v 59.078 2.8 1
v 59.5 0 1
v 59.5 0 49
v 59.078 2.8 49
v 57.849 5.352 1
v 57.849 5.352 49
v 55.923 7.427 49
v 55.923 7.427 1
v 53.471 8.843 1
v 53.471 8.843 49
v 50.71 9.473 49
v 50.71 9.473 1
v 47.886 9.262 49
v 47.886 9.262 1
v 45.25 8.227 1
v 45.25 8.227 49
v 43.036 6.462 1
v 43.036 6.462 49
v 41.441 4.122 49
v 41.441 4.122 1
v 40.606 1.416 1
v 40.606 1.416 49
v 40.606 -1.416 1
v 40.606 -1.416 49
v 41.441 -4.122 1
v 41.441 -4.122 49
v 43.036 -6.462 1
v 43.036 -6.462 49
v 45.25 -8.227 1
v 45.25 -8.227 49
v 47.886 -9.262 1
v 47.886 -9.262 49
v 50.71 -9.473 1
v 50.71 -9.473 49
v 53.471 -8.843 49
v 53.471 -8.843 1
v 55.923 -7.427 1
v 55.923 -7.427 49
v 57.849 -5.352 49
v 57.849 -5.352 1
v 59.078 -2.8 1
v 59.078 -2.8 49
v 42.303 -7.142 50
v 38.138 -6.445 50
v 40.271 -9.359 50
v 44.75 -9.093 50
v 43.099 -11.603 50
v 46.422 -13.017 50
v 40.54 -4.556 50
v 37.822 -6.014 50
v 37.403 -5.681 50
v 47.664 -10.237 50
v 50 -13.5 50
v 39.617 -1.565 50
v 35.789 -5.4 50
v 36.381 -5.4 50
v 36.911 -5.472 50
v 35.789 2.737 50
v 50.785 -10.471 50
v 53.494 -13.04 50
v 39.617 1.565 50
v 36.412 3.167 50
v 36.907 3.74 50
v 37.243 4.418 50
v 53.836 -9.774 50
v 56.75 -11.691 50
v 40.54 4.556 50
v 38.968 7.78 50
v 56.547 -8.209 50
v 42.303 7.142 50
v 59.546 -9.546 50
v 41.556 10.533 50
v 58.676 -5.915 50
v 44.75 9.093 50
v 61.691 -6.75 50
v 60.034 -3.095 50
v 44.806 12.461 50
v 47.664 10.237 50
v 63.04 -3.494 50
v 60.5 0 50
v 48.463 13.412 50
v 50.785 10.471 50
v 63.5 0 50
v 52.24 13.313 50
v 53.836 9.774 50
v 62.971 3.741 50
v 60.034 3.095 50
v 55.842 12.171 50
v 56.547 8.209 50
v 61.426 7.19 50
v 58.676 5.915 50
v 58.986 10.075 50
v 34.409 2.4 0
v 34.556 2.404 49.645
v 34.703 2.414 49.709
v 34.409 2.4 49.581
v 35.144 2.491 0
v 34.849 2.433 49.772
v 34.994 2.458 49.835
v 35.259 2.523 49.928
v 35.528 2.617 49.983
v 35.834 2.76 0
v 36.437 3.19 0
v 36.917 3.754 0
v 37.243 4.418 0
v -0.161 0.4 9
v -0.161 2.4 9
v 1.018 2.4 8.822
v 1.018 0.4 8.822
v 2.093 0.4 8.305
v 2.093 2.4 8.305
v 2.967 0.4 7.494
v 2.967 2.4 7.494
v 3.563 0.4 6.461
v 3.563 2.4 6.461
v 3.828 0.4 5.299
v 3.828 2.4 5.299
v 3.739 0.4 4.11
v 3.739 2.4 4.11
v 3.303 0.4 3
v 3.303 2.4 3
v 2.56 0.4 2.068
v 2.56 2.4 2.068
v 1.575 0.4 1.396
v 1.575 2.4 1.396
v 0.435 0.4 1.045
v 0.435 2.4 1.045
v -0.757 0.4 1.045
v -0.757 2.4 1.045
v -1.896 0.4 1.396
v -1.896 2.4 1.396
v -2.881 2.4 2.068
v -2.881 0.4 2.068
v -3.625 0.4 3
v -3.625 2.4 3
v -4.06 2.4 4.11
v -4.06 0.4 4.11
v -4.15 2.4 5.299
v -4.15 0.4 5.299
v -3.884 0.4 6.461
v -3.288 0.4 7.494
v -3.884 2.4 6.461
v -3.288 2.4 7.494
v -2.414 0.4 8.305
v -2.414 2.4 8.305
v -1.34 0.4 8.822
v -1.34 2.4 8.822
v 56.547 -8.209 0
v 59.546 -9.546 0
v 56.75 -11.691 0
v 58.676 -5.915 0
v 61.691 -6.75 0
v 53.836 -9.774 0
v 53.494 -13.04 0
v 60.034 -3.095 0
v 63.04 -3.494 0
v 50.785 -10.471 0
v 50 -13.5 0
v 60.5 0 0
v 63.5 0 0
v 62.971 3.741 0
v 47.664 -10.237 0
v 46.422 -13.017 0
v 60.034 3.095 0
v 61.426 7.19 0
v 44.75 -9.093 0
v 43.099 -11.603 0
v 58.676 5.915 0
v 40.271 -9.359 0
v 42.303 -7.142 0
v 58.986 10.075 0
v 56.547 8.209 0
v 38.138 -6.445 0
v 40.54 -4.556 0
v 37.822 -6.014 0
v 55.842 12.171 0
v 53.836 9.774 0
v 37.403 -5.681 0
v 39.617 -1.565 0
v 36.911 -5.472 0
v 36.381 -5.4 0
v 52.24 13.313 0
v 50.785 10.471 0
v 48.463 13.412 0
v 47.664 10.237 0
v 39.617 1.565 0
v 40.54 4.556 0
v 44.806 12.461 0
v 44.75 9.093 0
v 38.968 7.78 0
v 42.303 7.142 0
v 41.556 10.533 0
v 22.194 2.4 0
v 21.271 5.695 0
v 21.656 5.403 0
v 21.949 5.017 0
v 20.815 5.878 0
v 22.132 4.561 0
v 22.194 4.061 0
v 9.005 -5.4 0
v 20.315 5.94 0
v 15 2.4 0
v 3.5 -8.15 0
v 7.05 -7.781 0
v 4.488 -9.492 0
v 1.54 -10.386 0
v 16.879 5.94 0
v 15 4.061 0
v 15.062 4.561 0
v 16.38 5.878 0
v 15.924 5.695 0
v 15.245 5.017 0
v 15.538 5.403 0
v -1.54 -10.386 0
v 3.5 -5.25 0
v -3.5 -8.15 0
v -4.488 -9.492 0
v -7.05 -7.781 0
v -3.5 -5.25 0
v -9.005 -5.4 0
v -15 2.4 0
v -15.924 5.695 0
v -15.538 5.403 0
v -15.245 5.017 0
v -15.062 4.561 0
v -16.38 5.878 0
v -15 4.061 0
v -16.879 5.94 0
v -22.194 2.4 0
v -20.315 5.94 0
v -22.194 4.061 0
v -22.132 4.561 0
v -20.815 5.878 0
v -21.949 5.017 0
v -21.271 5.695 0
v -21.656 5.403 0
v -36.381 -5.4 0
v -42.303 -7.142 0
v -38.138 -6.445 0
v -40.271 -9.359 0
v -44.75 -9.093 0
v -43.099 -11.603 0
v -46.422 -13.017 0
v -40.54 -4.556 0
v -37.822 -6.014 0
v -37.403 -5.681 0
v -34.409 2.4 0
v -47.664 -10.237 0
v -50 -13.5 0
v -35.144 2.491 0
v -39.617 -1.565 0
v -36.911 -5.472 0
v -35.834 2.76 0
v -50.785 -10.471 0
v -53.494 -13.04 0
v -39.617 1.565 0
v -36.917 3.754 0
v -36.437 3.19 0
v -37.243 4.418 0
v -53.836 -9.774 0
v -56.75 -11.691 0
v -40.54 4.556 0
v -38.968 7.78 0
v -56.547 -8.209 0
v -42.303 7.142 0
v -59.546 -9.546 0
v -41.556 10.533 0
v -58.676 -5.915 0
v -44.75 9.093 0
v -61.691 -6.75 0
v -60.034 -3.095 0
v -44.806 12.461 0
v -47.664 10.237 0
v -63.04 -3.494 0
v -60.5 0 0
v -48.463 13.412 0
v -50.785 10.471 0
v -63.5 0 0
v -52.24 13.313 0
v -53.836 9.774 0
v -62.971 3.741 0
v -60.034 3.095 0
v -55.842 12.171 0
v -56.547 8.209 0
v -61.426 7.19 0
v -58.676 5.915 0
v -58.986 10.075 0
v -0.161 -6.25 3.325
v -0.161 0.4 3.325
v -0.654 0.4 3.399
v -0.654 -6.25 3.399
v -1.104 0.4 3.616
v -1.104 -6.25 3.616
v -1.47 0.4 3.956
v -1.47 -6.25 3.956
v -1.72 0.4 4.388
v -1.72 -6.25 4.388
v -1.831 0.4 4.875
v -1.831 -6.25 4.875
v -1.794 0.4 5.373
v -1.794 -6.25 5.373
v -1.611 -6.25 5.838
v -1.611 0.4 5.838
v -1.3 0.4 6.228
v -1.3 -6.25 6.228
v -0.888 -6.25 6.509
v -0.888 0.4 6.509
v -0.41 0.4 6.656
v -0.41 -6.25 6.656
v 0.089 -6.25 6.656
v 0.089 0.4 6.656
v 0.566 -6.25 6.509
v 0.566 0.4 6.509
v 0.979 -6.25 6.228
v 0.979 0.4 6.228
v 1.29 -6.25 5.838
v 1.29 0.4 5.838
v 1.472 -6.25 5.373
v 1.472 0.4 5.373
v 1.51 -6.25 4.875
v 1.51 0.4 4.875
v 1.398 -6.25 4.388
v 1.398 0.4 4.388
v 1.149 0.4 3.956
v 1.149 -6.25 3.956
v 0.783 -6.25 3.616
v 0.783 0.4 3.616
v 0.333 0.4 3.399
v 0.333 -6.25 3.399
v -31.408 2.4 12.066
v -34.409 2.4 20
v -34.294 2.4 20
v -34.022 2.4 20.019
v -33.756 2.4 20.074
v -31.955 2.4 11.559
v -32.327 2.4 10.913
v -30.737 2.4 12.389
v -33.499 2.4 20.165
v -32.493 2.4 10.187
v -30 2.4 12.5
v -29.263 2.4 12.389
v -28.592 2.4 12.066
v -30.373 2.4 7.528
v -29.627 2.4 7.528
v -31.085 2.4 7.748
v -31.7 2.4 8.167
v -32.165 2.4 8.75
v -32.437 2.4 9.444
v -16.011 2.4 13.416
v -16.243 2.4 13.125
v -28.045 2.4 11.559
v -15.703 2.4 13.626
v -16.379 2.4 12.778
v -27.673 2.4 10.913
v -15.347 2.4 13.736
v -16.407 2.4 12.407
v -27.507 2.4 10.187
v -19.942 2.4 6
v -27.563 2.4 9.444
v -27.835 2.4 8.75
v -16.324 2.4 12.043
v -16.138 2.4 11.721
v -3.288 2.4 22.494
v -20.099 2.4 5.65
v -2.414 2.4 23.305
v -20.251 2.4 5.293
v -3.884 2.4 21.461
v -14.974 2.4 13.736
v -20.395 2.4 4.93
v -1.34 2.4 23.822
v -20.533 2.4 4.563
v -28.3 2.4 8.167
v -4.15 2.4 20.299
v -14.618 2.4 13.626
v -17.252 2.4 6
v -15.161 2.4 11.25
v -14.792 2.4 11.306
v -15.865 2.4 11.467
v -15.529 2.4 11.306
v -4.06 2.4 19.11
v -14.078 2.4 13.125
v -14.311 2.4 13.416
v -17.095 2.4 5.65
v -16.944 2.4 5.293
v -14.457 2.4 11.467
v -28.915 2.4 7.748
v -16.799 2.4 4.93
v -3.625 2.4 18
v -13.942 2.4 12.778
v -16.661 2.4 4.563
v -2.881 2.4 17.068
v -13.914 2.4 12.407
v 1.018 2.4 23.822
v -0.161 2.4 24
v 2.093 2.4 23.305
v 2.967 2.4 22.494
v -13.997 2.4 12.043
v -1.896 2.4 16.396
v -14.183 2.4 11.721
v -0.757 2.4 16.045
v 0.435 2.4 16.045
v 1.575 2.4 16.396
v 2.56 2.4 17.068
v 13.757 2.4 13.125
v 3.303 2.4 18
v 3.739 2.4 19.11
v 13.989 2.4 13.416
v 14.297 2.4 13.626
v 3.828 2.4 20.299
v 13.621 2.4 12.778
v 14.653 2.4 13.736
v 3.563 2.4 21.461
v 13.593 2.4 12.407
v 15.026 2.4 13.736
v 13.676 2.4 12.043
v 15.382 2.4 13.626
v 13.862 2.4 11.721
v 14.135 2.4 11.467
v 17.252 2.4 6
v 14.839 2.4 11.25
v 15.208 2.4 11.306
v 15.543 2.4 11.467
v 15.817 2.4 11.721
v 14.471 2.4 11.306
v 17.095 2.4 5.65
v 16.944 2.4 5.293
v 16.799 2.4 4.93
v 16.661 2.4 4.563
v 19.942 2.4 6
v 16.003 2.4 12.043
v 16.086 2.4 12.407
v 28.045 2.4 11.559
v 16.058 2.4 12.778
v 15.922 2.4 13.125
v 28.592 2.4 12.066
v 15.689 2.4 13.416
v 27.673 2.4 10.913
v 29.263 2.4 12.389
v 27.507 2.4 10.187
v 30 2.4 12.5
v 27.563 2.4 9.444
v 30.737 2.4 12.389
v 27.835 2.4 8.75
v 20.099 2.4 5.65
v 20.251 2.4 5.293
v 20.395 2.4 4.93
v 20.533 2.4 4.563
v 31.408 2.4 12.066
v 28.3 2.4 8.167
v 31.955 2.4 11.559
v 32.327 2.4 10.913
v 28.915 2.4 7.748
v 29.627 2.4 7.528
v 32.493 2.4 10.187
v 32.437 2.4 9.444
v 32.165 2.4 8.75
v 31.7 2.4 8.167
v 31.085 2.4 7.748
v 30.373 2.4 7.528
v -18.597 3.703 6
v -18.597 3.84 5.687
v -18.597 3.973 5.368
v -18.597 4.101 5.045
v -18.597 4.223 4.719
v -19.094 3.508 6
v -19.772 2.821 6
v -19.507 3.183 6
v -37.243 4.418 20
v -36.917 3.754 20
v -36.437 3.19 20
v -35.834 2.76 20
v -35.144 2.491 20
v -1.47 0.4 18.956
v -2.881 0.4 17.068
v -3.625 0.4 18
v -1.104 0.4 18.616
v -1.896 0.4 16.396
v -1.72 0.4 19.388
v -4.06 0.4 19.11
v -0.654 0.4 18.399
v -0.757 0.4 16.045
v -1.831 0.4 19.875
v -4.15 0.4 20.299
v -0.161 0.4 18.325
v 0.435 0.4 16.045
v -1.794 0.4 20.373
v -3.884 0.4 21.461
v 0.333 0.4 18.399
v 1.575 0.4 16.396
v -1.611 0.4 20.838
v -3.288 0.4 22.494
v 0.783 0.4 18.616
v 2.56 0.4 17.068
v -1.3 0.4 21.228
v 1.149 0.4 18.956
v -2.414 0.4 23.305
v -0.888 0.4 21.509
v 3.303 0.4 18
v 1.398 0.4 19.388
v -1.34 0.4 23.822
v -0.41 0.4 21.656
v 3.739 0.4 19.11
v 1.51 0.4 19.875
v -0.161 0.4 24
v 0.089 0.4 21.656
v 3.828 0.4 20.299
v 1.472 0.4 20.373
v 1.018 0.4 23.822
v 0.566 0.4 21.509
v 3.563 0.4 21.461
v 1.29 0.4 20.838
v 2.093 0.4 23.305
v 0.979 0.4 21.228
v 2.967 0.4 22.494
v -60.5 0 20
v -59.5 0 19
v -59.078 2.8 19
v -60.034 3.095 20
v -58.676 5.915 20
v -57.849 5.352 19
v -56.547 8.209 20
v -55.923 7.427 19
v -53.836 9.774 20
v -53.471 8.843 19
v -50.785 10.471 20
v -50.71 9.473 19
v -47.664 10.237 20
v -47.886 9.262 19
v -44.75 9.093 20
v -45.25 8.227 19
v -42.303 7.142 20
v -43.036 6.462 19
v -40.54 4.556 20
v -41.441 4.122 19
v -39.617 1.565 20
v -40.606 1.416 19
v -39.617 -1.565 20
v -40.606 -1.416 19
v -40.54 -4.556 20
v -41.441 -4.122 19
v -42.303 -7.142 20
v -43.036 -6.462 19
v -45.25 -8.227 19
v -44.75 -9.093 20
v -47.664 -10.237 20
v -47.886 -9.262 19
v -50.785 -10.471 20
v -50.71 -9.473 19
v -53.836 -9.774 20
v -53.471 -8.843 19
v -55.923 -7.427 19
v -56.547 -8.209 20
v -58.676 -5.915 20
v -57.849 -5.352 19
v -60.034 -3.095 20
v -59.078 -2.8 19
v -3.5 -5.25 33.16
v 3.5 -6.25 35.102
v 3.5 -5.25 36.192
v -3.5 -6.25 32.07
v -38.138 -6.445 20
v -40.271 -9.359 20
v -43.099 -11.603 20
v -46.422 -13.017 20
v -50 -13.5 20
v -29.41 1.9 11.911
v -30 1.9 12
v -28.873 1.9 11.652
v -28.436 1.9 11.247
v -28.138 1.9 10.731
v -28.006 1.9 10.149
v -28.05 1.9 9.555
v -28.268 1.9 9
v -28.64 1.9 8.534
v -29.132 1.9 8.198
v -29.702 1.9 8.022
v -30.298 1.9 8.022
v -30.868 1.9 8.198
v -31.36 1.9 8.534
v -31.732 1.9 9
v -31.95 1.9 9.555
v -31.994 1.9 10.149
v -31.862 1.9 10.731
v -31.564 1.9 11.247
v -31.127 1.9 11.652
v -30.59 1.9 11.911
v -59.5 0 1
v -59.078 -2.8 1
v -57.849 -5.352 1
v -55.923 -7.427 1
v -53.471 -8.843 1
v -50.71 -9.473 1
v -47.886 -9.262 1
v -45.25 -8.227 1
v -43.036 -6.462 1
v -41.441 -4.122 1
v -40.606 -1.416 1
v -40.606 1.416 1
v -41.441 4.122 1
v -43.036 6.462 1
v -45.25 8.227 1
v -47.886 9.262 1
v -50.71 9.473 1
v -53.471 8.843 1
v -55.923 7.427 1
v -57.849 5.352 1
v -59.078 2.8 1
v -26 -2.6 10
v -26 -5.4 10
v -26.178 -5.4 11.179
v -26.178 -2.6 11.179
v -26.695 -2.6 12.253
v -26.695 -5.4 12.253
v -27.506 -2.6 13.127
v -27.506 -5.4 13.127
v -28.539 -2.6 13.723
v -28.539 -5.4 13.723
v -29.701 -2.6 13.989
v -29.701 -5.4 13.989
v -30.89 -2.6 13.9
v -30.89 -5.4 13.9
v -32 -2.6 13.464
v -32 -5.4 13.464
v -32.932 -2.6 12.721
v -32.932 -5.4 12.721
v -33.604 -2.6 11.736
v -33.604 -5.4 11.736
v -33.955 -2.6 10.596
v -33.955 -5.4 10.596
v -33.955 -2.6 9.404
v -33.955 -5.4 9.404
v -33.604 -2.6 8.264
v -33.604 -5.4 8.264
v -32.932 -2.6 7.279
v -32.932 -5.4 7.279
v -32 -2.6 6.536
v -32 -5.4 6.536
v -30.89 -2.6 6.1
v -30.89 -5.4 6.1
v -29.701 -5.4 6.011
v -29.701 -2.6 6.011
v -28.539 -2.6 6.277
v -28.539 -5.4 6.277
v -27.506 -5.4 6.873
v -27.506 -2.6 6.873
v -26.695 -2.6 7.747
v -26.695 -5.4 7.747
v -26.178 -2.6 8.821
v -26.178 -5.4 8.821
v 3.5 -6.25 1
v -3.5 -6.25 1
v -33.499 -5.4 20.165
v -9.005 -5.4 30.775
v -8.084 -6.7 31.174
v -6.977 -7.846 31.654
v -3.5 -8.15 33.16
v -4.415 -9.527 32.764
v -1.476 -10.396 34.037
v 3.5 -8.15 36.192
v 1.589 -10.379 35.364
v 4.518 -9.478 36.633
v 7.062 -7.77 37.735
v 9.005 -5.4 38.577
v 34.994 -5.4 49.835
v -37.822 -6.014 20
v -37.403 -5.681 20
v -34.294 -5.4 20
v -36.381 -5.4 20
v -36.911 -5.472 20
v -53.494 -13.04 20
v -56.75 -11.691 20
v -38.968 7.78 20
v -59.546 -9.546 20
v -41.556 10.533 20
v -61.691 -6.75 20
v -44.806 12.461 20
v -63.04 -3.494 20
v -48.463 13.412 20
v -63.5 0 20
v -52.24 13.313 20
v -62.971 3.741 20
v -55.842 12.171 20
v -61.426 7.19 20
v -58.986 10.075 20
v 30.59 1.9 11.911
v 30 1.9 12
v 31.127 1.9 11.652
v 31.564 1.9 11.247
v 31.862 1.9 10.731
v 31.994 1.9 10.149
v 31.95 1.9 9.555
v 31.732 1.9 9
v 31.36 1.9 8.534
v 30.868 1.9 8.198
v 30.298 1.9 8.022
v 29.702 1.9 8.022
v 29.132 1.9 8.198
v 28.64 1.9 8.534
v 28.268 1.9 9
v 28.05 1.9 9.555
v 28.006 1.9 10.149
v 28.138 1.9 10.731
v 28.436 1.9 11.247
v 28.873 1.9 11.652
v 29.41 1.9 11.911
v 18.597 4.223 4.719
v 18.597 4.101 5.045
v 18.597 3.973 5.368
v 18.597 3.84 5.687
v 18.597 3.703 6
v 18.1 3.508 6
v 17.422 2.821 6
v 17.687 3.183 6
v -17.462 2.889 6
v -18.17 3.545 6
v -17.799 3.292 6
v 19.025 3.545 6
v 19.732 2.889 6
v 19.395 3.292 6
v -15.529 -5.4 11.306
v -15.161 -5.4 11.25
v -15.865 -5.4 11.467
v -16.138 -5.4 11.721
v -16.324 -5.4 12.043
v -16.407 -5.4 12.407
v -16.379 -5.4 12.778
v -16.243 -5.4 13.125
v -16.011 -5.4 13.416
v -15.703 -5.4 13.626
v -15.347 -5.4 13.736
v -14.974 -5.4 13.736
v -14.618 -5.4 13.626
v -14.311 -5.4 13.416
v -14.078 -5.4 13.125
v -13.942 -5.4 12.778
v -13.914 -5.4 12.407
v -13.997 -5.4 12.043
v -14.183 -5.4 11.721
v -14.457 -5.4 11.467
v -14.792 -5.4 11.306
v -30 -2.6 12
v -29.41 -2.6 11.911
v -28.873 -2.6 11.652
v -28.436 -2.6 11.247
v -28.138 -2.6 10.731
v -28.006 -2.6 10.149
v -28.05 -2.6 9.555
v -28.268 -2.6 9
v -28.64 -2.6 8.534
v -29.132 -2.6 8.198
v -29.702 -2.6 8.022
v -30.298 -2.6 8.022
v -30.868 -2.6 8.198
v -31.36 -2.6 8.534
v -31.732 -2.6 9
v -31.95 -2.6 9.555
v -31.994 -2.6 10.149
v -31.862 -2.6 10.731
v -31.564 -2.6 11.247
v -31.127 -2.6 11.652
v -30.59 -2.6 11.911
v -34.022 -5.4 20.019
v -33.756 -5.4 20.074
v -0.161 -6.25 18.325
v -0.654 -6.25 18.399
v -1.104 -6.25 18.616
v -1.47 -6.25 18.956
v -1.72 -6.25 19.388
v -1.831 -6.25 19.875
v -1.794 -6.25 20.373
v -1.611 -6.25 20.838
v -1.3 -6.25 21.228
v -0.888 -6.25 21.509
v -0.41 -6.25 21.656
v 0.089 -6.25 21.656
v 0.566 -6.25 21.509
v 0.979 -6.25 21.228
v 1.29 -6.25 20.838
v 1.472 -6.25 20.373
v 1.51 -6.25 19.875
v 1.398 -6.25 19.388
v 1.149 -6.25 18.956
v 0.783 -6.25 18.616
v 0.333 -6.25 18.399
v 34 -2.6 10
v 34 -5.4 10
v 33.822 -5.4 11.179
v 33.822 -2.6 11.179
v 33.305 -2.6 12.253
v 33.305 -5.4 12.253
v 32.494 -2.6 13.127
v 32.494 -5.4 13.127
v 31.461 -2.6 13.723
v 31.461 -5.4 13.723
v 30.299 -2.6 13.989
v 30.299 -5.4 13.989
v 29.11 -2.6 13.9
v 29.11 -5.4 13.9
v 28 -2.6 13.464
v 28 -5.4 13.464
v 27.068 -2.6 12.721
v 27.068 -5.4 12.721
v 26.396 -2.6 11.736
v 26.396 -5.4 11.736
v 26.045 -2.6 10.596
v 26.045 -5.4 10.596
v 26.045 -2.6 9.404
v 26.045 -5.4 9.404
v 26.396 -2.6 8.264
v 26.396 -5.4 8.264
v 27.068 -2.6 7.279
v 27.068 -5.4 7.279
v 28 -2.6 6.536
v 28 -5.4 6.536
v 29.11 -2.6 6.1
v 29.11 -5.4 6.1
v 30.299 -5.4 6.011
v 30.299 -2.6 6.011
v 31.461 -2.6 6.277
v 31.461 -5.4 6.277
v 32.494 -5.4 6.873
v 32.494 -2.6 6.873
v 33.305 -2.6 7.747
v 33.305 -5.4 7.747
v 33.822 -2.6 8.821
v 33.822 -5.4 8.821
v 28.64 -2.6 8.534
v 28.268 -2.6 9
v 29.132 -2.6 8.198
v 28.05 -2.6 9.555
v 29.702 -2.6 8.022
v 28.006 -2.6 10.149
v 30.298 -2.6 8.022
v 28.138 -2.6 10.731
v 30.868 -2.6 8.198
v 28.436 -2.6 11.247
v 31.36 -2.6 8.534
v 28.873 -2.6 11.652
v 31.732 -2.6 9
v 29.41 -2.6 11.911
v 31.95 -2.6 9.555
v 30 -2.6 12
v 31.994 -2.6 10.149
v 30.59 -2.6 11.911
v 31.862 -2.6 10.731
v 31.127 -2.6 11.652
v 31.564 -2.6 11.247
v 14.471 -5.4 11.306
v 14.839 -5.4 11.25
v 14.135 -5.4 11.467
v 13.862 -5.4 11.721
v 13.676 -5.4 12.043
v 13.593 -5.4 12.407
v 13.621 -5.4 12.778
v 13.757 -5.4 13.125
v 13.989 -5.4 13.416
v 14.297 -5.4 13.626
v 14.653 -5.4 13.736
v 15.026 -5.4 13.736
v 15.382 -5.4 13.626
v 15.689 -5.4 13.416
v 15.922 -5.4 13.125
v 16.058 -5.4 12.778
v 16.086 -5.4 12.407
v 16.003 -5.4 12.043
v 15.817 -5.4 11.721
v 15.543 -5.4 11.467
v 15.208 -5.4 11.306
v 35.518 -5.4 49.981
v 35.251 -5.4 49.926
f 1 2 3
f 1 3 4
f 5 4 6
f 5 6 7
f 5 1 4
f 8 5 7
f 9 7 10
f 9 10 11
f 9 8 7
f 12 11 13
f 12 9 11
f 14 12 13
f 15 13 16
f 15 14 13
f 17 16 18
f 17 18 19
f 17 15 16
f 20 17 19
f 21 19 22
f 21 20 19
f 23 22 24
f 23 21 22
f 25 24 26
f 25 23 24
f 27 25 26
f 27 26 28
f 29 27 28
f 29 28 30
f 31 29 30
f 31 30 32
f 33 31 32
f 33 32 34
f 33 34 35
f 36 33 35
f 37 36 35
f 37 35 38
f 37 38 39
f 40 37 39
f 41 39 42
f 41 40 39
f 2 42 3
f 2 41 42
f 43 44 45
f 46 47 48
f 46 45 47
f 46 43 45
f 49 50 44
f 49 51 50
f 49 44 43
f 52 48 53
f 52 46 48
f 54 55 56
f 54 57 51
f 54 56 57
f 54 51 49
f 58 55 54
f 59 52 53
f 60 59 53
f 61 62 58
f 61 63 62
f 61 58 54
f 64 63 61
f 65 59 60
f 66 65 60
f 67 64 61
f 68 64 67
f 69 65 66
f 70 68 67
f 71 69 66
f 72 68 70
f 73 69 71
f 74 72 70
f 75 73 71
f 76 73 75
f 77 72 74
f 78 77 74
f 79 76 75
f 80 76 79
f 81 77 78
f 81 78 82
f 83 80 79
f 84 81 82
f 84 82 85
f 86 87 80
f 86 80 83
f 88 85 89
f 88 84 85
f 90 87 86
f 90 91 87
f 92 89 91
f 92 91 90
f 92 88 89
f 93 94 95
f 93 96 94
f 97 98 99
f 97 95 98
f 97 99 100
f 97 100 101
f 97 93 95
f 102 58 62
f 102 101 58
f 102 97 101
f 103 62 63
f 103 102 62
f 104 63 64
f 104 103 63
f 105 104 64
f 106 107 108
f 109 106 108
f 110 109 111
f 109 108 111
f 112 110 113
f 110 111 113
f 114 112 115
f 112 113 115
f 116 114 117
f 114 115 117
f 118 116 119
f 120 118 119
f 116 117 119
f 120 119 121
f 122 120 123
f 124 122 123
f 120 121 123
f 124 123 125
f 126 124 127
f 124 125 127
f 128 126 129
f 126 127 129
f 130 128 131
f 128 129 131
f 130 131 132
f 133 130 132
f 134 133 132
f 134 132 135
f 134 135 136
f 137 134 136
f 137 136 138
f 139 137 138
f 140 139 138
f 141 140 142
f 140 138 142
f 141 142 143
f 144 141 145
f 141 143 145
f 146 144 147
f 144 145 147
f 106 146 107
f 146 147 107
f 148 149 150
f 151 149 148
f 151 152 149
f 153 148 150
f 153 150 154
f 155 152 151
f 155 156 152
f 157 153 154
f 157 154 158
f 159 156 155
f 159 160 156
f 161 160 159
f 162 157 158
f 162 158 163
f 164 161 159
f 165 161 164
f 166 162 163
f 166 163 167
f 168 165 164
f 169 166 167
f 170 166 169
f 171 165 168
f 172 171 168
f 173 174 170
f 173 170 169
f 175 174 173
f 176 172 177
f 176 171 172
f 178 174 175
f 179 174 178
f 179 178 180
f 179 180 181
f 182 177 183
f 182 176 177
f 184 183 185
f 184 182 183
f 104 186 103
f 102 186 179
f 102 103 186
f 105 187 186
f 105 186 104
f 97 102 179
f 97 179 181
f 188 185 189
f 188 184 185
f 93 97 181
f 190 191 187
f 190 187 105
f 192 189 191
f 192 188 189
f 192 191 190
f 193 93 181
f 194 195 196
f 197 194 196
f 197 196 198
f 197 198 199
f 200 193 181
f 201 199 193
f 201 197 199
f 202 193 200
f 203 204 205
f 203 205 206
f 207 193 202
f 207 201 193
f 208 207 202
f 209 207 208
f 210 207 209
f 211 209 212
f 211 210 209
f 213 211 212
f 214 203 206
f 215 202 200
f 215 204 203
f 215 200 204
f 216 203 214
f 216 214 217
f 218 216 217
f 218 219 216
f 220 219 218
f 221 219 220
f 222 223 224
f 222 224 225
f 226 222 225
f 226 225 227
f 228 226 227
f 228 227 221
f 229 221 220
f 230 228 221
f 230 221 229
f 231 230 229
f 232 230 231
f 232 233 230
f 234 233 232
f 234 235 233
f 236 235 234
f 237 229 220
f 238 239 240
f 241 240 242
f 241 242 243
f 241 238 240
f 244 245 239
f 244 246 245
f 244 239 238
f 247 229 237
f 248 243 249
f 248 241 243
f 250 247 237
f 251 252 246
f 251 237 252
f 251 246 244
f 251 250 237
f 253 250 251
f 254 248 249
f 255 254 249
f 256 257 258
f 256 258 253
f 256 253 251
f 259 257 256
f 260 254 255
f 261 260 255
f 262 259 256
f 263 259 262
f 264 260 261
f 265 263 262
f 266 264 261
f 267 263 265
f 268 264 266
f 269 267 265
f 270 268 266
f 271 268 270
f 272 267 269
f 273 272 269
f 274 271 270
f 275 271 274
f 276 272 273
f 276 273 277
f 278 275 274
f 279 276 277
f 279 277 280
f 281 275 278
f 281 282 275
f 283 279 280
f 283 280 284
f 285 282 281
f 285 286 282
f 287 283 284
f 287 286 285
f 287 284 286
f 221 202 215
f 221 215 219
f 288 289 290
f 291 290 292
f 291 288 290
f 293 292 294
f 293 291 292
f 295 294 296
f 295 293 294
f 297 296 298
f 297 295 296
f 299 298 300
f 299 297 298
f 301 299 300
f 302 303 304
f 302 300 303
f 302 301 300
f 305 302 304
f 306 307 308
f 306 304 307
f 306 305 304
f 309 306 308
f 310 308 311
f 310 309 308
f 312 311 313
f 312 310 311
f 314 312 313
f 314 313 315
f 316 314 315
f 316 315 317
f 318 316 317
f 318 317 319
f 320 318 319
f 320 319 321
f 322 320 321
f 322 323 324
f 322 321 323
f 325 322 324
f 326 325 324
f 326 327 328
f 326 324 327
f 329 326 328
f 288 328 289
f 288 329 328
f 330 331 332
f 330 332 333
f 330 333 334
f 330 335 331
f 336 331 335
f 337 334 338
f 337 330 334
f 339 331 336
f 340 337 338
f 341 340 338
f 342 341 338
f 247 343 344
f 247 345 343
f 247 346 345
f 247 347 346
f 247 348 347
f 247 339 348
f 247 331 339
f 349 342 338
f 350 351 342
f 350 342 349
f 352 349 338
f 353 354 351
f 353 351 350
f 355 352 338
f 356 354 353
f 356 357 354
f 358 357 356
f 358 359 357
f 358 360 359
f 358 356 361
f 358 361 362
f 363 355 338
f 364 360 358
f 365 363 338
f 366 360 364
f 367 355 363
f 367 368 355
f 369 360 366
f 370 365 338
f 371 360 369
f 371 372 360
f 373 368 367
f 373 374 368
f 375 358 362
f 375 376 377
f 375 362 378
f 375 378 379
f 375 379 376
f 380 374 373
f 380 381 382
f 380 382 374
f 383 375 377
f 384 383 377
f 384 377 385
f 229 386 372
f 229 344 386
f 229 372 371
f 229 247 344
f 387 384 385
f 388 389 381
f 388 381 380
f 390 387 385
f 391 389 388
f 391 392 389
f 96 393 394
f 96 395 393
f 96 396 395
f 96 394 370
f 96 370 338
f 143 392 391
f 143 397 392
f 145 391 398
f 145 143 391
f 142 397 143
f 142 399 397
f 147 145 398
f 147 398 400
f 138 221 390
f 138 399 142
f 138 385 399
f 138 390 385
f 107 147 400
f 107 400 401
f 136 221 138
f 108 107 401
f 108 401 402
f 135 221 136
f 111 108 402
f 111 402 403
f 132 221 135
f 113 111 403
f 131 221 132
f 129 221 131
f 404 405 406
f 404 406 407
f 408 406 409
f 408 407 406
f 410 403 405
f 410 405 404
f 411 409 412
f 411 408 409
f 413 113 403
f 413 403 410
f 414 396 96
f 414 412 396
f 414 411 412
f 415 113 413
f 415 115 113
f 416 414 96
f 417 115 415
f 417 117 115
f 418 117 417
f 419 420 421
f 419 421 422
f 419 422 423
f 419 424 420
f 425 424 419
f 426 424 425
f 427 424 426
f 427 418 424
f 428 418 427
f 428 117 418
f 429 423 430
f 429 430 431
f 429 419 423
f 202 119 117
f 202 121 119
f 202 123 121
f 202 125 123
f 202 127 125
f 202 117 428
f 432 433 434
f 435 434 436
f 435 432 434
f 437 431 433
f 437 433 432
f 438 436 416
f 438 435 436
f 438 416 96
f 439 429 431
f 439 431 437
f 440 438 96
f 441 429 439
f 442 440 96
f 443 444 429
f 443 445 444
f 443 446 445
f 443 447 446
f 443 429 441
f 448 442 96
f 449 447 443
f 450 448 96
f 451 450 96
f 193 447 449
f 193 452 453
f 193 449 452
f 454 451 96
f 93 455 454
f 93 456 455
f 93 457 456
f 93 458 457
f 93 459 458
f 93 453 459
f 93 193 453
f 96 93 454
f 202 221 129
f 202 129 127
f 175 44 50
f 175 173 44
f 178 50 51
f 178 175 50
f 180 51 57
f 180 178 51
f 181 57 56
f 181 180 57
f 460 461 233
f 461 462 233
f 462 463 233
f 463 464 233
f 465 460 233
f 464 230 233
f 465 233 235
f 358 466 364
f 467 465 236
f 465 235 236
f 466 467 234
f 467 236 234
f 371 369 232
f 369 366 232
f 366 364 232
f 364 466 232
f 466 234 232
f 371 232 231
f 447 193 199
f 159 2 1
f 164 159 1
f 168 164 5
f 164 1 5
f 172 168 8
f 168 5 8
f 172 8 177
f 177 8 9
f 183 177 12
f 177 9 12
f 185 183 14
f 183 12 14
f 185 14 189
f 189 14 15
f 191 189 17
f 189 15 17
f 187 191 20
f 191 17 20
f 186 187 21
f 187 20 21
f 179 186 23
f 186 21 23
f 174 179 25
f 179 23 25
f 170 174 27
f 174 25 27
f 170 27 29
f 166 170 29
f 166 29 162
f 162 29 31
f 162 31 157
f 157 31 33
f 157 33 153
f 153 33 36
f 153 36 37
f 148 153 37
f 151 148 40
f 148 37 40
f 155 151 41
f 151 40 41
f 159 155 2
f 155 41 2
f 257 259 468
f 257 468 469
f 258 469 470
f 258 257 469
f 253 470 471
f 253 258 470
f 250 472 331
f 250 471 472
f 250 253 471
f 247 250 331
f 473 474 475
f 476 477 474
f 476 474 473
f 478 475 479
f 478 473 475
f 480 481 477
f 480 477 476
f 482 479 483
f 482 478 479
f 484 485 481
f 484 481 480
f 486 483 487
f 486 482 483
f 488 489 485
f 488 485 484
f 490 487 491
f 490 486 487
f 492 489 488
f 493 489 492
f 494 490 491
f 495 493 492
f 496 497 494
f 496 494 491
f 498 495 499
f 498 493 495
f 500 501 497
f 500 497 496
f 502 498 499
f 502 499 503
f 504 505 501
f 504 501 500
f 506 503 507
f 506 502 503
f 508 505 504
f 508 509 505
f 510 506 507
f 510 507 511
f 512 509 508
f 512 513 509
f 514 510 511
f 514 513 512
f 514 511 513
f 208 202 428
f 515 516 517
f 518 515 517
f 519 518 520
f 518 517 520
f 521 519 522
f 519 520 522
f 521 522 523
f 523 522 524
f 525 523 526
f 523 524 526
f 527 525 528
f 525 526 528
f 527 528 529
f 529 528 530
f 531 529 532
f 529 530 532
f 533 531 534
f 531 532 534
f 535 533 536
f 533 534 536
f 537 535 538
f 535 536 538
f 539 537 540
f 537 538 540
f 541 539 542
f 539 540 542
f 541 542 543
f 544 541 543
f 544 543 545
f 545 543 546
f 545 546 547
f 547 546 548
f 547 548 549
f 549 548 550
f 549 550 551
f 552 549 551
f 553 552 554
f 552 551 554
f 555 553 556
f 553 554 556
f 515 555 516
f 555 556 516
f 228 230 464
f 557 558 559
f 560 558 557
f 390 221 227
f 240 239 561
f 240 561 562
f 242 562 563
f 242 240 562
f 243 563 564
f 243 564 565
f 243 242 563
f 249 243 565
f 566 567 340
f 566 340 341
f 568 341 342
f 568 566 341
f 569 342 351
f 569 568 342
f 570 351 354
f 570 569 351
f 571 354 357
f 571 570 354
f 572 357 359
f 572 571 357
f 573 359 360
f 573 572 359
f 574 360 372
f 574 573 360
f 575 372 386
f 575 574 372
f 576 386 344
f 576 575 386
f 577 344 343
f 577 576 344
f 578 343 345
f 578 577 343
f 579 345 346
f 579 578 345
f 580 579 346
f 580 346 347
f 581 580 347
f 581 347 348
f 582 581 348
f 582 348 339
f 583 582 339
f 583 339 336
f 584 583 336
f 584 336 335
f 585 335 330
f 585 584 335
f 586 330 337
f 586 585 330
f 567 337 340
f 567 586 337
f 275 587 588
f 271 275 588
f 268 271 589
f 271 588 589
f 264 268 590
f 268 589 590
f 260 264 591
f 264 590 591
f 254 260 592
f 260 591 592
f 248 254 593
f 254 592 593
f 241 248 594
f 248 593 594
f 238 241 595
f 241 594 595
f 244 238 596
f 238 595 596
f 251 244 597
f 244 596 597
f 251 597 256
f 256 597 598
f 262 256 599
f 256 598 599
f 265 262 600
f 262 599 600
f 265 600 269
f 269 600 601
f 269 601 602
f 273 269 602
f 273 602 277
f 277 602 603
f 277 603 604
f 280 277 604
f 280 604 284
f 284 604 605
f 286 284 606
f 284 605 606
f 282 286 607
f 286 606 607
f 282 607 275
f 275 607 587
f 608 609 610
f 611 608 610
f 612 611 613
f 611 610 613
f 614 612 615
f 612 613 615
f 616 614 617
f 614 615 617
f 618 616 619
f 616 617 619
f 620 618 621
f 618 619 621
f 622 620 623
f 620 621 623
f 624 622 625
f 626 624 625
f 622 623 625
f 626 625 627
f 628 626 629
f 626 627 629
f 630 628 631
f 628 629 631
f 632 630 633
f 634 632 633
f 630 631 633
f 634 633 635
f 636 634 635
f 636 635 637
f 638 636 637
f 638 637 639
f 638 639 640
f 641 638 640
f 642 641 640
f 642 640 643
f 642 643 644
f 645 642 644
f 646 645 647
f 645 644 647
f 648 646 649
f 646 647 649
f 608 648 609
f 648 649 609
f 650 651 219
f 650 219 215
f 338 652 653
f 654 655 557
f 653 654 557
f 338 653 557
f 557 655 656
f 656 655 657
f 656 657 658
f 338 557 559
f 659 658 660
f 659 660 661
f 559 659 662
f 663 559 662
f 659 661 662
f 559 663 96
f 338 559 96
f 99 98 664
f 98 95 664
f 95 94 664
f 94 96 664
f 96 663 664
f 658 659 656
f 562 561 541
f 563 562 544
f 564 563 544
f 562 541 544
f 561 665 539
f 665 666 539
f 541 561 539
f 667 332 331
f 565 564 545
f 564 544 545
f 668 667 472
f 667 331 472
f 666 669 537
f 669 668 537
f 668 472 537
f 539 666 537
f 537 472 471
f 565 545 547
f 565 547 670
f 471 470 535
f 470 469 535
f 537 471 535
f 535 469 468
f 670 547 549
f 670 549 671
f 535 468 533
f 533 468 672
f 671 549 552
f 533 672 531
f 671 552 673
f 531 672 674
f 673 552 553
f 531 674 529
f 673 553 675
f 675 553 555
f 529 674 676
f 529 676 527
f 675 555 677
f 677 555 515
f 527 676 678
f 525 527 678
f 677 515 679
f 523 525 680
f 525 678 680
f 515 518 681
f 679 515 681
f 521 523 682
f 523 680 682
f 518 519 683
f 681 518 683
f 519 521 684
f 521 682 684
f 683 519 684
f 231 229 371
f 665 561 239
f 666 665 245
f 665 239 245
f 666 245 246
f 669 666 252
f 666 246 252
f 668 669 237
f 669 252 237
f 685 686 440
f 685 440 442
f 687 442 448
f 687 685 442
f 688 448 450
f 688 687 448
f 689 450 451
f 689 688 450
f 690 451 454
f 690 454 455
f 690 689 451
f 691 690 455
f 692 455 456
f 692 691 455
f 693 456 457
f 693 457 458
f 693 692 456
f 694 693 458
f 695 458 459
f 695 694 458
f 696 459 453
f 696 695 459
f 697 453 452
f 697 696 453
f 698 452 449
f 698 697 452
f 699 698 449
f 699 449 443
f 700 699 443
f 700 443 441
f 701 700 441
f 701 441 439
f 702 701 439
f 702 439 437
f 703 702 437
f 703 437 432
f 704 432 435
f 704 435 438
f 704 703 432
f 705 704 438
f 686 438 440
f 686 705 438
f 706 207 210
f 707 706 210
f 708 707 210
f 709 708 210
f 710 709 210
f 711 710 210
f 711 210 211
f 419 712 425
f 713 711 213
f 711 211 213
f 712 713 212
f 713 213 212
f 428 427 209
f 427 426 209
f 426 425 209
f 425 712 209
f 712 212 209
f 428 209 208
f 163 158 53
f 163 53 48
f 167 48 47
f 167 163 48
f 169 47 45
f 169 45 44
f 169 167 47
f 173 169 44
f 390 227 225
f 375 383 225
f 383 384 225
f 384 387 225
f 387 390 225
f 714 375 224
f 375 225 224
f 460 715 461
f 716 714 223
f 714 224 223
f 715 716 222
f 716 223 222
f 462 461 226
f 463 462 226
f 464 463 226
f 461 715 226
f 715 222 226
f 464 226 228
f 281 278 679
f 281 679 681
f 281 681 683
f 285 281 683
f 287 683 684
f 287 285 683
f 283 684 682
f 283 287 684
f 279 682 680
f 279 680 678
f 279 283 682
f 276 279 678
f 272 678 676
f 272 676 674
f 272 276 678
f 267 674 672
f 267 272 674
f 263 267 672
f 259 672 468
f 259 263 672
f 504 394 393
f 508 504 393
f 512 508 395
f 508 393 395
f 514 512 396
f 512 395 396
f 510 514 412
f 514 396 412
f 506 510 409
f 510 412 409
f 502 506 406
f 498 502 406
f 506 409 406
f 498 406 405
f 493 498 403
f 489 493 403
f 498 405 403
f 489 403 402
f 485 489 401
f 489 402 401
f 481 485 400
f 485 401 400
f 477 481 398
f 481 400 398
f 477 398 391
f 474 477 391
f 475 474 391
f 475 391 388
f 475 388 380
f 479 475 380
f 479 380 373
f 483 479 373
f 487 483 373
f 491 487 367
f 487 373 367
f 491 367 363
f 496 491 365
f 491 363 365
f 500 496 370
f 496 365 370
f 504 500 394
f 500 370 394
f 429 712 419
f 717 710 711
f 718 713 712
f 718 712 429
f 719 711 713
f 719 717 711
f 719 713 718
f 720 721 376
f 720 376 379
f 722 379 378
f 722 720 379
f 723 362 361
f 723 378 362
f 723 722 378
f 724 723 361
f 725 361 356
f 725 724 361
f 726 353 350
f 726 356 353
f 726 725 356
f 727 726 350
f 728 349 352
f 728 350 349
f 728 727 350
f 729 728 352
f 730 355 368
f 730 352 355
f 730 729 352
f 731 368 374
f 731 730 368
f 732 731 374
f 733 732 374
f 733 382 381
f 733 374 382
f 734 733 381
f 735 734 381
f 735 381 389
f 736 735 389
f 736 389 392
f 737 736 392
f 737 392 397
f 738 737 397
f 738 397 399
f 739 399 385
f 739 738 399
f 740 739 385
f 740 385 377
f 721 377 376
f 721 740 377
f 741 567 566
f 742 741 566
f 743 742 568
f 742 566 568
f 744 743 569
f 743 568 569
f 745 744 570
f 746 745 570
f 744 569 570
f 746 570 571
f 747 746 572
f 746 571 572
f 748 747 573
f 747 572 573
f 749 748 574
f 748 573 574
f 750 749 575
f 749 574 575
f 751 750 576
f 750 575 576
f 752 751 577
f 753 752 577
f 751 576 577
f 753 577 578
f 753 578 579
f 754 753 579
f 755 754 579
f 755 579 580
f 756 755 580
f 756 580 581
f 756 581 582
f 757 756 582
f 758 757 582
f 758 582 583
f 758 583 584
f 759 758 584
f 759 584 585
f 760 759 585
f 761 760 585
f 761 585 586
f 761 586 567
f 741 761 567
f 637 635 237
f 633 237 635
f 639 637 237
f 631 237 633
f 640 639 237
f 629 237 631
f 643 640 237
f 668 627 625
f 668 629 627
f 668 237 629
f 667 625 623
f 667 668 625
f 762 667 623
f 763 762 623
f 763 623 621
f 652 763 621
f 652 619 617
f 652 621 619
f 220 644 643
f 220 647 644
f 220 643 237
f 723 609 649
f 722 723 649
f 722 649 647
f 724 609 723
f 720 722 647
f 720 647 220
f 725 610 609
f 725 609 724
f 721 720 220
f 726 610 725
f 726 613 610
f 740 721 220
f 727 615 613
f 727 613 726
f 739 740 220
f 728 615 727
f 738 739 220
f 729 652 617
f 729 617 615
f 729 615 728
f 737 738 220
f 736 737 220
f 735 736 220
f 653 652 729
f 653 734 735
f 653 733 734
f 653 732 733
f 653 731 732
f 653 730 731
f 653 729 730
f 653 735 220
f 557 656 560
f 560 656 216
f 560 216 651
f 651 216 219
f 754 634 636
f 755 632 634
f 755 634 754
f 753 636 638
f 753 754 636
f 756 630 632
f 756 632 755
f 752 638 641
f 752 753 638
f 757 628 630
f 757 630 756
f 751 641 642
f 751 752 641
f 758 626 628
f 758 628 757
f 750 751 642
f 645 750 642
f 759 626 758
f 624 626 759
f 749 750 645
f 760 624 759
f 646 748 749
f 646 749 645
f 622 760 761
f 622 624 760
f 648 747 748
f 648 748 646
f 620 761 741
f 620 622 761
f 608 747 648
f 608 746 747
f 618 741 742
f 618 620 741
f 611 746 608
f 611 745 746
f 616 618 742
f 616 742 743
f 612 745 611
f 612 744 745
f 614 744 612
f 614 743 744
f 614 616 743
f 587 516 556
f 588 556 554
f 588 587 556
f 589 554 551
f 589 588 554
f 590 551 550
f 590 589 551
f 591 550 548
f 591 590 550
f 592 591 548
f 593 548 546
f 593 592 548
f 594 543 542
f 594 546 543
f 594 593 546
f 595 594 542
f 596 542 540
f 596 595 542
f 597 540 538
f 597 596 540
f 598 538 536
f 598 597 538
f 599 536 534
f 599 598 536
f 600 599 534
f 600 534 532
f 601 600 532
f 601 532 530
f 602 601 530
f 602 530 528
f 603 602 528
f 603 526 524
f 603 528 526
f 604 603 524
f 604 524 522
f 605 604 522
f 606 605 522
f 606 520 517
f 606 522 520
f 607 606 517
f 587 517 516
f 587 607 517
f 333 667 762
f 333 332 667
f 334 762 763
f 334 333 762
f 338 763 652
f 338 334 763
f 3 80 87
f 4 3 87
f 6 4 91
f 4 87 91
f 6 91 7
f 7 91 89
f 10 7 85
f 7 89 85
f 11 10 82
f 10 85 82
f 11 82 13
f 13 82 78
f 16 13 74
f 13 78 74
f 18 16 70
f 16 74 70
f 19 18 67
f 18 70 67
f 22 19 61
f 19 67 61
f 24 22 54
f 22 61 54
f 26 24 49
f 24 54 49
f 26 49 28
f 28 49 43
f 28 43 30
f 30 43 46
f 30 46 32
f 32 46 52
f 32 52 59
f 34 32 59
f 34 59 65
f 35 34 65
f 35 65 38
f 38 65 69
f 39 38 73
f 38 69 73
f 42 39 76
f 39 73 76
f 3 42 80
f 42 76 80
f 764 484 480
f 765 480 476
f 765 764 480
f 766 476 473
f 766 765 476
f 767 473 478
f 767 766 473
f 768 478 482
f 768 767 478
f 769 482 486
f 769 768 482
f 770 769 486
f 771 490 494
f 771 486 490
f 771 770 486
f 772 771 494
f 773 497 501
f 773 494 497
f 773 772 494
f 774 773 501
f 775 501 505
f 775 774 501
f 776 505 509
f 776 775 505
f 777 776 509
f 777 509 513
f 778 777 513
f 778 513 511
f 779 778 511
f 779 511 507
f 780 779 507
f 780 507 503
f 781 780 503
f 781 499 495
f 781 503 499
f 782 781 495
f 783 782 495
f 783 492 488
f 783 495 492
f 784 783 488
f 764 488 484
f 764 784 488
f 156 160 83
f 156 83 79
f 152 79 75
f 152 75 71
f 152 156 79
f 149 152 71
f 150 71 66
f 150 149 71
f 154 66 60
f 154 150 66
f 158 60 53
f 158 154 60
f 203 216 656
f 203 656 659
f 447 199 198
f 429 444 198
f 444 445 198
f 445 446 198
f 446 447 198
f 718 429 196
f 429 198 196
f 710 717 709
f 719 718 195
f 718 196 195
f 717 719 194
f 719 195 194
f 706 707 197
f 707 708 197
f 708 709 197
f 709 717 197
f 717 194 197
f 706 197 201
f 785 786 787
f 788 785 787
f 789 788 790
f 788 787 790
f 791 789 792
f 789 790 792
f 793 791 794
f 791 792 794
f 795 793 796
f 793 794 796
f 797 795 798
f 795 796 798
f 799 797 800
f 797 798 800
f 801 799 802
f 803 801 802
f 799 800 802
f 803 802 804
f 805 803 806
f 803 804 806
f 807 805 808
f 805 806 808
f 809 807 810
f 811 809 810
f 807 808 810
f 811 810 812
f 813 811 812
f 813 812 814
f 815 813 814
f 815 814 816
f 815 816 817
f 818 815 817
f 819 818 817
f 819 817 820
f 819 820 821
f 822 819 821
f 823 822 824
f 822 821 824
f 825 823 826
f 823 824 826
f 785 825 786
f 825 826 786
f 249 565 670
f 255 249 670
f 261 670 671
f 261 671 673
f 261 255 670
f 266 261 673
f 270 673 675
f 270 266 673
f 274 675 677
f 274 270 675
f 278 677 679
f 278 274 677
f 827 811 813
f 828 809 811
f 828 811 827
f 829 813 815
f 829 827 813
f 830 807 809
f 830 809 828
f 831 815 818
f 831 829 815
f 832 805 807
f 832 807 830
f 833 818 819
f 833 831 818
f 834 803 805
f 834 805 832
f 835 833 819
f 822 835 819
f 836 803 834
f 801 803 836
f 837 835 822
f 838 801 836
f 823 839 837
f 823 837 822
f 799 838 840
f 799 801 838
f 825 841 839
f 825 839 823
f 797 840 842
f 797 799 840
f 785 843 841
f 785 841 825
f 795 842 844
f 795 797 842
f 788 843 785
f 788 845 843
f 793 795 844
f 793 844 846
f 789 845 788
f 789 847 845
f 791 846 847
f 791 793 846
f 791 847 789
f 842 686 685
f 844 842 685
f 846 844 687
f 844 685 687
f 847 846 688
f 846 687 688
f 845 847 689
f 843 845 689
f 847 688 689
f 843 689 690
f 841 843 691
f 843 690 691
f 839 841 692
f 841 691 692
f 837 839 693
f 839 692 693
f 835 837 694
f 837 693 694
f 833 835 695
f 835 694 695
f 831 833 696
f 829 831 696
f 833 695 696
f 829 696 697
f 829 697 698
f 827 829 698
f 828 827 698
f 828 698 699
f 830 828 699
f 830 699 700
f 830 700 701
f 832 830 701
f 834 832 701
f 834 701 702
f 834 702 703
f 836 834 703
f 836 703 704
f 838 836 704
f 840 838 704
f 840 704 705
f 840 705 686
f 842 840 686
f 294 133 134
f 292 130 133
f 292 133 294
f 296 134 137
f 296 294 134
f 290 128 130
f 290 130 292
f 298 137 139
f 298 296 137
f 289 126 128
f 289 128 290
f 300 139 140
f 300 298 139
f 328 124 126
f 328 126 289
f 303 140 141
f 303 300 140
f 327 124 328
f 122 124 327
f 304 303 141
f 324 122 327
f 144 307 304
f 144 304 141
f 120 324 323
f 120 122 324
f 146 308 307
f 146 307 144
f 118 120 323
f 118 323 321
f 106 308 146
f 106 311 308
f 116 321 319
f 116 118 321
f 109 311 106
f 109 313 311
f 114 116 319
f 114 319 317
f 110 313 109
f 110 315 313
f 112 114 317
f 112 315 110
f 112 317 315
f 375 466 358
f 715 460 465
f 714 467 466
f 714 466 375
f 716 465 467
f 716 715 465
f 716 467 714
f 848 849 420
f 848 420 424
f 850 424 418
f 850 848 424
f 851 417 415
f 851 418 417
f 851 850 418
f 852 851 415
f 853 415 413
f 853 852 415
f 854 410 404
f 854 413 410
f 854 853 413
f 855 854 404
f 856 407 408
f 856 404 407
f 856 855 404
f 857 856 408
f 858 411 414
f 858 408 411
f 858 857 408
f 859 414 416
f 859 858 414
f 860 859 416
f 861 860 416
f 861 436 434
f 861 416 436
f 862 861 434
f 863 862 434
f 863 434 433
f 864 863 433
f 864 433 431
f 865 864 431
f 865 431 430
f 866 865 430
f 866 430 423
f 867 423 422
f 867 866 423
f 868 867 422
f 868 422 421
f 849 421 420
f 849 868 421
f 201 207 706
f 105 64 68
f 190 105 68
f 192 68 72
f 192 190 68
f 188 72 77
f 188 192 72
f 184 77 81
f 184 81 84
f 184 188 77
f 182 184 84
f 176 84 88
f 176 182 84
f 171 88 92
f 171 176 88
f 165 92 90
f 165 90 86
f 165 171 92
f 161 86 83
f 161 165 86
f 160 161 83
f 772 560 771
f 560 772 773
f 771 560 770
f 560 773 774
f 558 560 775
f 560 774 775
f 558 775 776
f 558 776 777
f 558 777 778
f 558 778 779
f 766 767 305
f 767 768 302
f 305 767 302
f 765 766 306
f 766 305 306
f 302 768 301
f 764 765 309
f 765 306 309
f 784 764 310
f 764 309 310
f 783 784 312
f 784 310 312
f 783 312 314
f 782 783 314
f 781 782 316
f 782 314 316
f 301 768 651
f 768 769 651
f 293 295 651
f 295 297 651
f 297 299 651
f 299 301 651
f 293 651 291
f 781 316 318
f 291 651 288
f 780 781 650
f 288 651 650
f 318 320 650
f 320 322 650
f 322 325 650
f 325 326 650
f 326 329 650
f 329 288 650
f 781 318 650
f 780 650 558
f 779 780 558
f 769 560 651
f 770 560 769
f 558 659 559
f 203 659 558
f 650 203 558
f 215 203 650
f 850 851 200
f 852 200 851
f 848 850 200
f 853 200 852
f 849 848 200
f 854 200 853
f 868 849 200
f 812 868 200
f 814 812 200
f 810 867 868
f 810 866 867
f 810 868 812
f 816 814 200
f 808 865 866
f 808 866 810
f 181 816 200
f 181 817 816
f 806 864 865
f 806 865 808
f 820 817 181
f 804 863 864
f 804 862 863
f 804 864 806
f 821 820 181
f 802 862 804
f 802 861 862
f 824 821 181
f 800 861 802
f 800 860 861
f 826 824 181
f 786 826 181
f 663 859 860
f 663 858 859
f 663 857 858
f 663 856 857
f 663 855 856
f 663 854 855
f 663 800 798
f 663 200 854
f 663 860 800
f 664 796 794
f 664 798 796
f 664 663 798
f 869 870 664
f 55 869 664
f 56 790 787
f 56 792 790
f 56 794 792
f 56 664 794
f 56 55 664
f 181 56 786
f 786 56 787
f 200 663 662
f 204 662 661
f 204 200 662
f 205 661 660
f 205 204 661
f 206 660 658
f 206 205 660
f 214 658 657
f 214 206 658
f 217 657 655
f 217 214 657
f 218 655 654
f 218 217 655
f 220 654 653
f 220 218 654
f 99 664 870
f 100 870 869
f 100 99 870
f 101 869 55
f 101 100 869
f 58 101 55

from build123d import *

# Parameters (mm, degrees)
SKETCH1_R                     = 9.5
SKETCH1_W                     = 7
SKETCH1_H                     = 1.9
BOSS_EXTRUDE1_DEPTH           = 50
SKETCH32_W                    = 32.172664372
SKETCH32_H                    = 50
SKETCH32_W_2                  = 30.763378825
BOSS_EXTRUDE4_DEPTH           = 3
SKETCH30_R                    = 1.675
SKETCH30_R_2                  = 1.25
CUT_EXTRUDE14_DEPTH           = 84.200435696
SKETCH31_R                    = 4
CUT_EXTRUDE15_DEPTH           = 2
CHAMFER1_SIZE                 = 1
SKETCH36_R                    = 2
CUT_EXTRUDE18_DEPTH           = 83.371475645
SKETCH37_R                    = 4
CUT_EXTRUDE19_DEPTH           = 2.8
SKETCH38_W                    = 7.194206864
SKETCH38_H                    = 7.080700956
BOSS_EXTRUDE6_DEPTH           = 6
BOSS_EXTRUDE6_DRAFT           = 20
BOSS_EXTRUDE6_PROFILE_2_DEPTH = 6
BOSS_EXTRUDE6_PROFILE_2_DRAFT = 20
FILLET2_R                     = 2
CHAMFER2_SIZE                 = 0.5
CUT_EXTRUDE20_START           = -10
SKETCH39_W                    = 33.713665857
SKETCH39_H                    = 35.884460507
CUT_EXTRUDE20_DEPTH           = 67.252868798
CUT_EXTRUDE21_DEPTH           = 83.371475645
CUT_EXTRUDE21_DEPTH_BACK      = 83.371475645
CHAMFER3_SIZE                 = 1
FILLET3_R                     = 2


with BuildPart() as part:
    # Sketch1 → Boss-Extrude1 (new body)
    with BuildSketch(Plane.XY):
        with BuildLine():
            Line((-34.408656248, 2.4), (34.408656248, 2.4))
            ThreePointArc((34.408656248, 2.4), (36.148562201, 2.95608362), (37.243446021, 4.418181818))
            ThreePointArc((37.243446021, 4.418181818), (52.24014746, 13.312841145), (63.5, 0))
            ThreePointArc((63.5, 0), (59.545941546, -9.545941546), (50, -13.5))
            ThreePointArc((50, -13.5), (42.170423209, -10.99762371), (37.243446021, -4.418181818))
            ThreePointArc((37.243446021, -4.418181818), (36.148562201, -2.95608362), (34.408656248, -2.4))
            Line((34.408656248, -2.4), (12.372954376, -2.4))
            ThreePointArc((12.372954376, -2.4), (10.729786704, -2.89001992), (9.623408959, -4.2))
            ThreePointArc((9.623408959, -4.2), (0, -10.5), (-9.623408959, -4.2))
            ThreePointArc((-9.623408959, -4.2), (-10.729786704, -2.89001992), (-12.372954376, -2.4))
            Line((-12.372954376, -2.4), (-34.408656248, -2.4))
            ThreePointArc((-34.408656248, -2.4), (-36.148562201, -2.95608362), (-37.243446021, -4.418181818))
            ThreePointArc((-37.243446021, -4.418181818), (-42.170423209, -10.99762371), (-50, -13.5))
            ThreePointArc((-50, -13.5), (-59.545941546, -9.545941546), (-63.5, 0))
            ThreePointArc((-63.5, 0), (-52.24014746, 13.312841145), (-37.243446021, 4.418181818))
            ThreePointArc((-37.243446021, 4.418181818), (-36.148562201, 2.95608362), (-34.408656248, 2.4))
        make_face()
        with Locations((50, 0)):
            Circle(SKETCH1_R, mode=Mode.SUBTRACT)
        with Locations(Location((-50, 0, 0), (0, 0, 180))):
            Circle(SKETCH1_R, mode=Mode.SUBTRACT)
        with Locations((0, -7.2)):
            Rectangle(SKETCH1_W, SKETCH1_H, mode=Mode.SUBTRACT)
    extrude(amount=BOSS_EXTRUDE1_DEPTH)

    # Sketch32 → Boss-Extrude4 (add)
    with BuildSketch(Plane.XZ.offset(2.4)):
        with Locations((-22.574766715, 25)):
            Rectangle(SKETCH32_W, SKETCH32_H)
        with Locations((23.370404996, 25)):
            Rectangle(SKETCH32_W_2, SKETCH32_H)
    extrude(amount=BOSS_EXTRUDE4_DEPTH)

    # Sketch30 → Cut-Extrude14 (cut, through all)
    with BuildSketch(Plane(origin=(0, -6.25, 0), x_dir=(1, 0, 0), z_dir=(0, 1, 0))):
        with Locations(Location((-0.160776584, -5, 0), (0, 0, 90))):
            Circle(SKETCH30_R)
        with Locations(Location((-0.160776584, -20, 0), (0, 0, 90))):
            Circle(SKETCH30_R)
        with Locations(Location((14.839223416, -12.5, 0), (0, 0, 90))):
            Circle(SKETCH30_R_2)
        with Locations(Location((-15.160776584, -12.5, 0), (0, 0, 90))):
            Circle(SKETCH30_R_2)
    extrude(amount=CUT_EXTRUDE14_DEPTH, mode=Mode.SUBTRACT)

    # Sketch31 → Cut-Extrude15 (cut)
    with BuildSketch(Plane(origin=(0, 2.4, 0), x_dir=(1, 0, 0), z_dir=(0, 1, 0))):
        with Locations(Location((-0.160776584, -5, 0), (0, 0, 270))):
            Circle(SKETCH31_R)
        with Locations(Location((-0.160776584, -20, 0), (0, 0, 270))):
            Circle(SKETCH31_R)
    extrude(amount=-CUT_EXTRUDE15_DEPTH, mode=Mode.SUBTRACT)

    # Chamfer1
    chamfer1_edges = [part.edges().sort_by_distance(p)[0] for p in [
        (0, -6.25, 0),
        (0, -6.25, 50),
    ]]
    chamfer(chamfer1_edges, length=CHAMFER1_SIZE)

    # Sketch36 → Cut-Extrude18 (cut, through all)
    with BuildSketch(Plane(origin=(0, 2.4, 0), x_dir=(1, 0, 0), z_dir=(0, 1, 0))):
        with Locations(Location((30, -10, 0), (0, 0, 270))):
            Circle(SKETCH36_R)
        with Locations(Location((-30, -10, 0), (0, 0, 270))):
            Circle(SKETCH36_R)
    extrude(amount=-CUT_EXTRUDE18_DEPTH, mode=Mode.SUBTRACT)

    # Sketch37 → Cut-Extrude19 (cut)
    with BuildSketch(Plane.XZ.offset(5.4)):
        with Locations((30, 10)):
            Circle(SKETCH37_R)
        with Locations((-30, 10)):
            Circle(SKETCH37_R)
    extrude(amount=-CUT_EXTRUDE19_DEPTH, mode=Mode.SUBTRACT)


with BuildPart() as boss_extrude6_tool:
    # Sketch38 → Boss-Extrude6 (with draft: the straight prism first)
    with BuildSketch(Plane(origin=(0, 2.4, 0), x_dir=(1, 0, 0), z_dir=(0, 0, 1))):
        with Locations((18.597103432, 0)):
            Rectangle(SKETCH38_W, SKETCH38_H)
    extrude(amount=BOSS_EXTRUDE6_DEPTH)
    # Boss-Extrude6: the draft: its side faces are tilted about the plane it starts from
    boss_extrude6_sides = [boss_extrude6_tool.faces().sort_by_distance(p)[0] for p in [
        (22.194206864, 2.4, 3),
        (18.597103432, 5.940350478, 3),
        (15, 2.4, 3),
        (18.597103432, -1.140350478, 3),
    ]]
    draft(boss_extrude6_sides, Plane(origin=(0, 2.4, 0), x_dir=(1, 0, 0), z_dir=(0, 0, 1)), BOSS_EXTRUDE6_DRAFT)


with BuildPart() as part_1:
    add(part.part)

    # Boss-Extrude6: add boss_extrude6_tool
    add(boss_extrude6_tool.part)


with BuildPart() as boss_extrude6_profile_2_tool:
    # Sketch38 → Boss-Extrude6 profile 2 (with draft: the straight prism first)
    with BuildSketch(Plane(origin=(0, 2.4, 0), x_dir=(1, 0, 0), z_dir=(0, 0, 1))):
        with Locations((-18.597103432, 0)):
            Rectangle(SKETCH38_W, SKETCH38_H)
    extrude(amount=BOSS_EXTRUDE6_PROFILE_2_DEPTH)
    # Boss-Extrude6 profile 2: the draft: its side faces are tilted about the plane it starts from
    boss_extrude6_profile_2_sides = [boss_extrude6_profile_2_tool.faces().sort_by_distance(p)[0] for p in [
        (-15, 2.4, 3),
        (-18.597103432, 5.940350478, 3),
        (-22.194206864, 2.4, 3),
        (-18.597103432, -1.140350478, 3),
    ]]
    draft(boss_extrude6_profile_2_sides, Plane(origin=(0, 2.4, 0), x_dir=(1, 0, 0), z_dir=(0, 0, 1)), BOSS_EXTRUDE6_PROFILE_2_DRAFT)


with BuildPart() as part_2:
    add(part_1.part)

    # Boss-Extrude6 profile 2: add boss_extrude6_profile_2_tool
    add(boss_extrude6_profile_2_tool.part)

    # Fillet2
    # the kernel refuses this fillet: 2 mm, written as the material it takes off along each edge
    with BuildSketch(Plane(origin=(23.632882776, 7.37902639, -3.952729582), x_dir=(0.11068304606838114, -0.946188648339465, -0.30409916978933155), z_dir=(-0.32361557711818506, -0.3236155771181852, 0.8891264907159881))) as fillet2_piece_1_section:
        with BuildLine():
            CenterArc((FILLET2_R * 0.889126490716, -FILLET2_R), FILLET2_R, 90, 83.282286536)
            Line((-FILLET2_R * 0.104008041637, -FILLET2_R * 0.883022221559), (0, 0))
            Line((0, 0), (FILLET2_R * 0.889126490716, 0))
        make_face()
    fillet2_piece_1 = extrude(amount=15.6394611, mode=Mode.PRIVATE)
    fillet2_piece_1 = split(fillet2_piece_1, bisect_by=Plane(origin=(20.940546386, 2.4, 2.229867585), z_dir=(0, 1, 0)), keep=Keep.TOP, mode=Mode.PRIVATE)
    add(fillet2_piece_1, mode=Mode.SUBTRACT)
    with BuildSketch(Plane(origin=(13.561324088, 7.37902639, -3.952729582), x_dir=(0.9461886483394653, 0.1106830460683812, -0.30409916978933144), z_dir=(0.3236155771181851, -0.32361557711818495, 0.8891264907159883))) as fillet2_piece_2_section:
        with BuildLine():
            CenterArc((FILLET2_R * 0.889126490716, -FILLET2_R), FILLET2_R, 90, 83.282286536)
            Line((-FILLET2_R * 0.104008041637, -FILLET2_R * 0.883022221559), (0, 0))
            Line((0, 0), (FILLET2_R * 0.889126490716, 0))
        make_face()
    fillet2_piece_2 = extrude(amount=15.6394611, mode=Mode.PRIVATE)
    fillet2_piece_2 = split(fillet2_piece_2, bisect_by=Plane(origin=(16.253660478, 2.4, 2.229867585), z_dir=(0, 1, 0)), keep=Keep.TOP, mode=Mode.PRIVATE)
    add(fillet2_piece_2, mode=Mode.SUBTRACT)
    with BuildSketch(Plane(origin=(-23.632882776, 7.37902639, -3.952729582), x_dir=(-0.11068304606838135, -0.9461886483394651, -0.3040991697893313), z_dir=(0.32361557711818506, -0.3236155771181851, 0.8891264907159881))) as fillet2_piece_3_section:
        with BuildLine():
            CenterArc((FILLET2_R * 0.889126490716, FILLET2_R), FILLET2_R, 186.717713464, 83.282286536)
            Line((-FILLET2_R * 0.104008041637, FILLET2_R * 0.883022221559), (0, 0))
            Line((0, 0), (FILLET2_R * 0.889126490716, 0))
        make_face()
    fillet2_piece_3 = extrude(amount=15.6394611, mode=Mode.PRIVATE)
    fillet2_piece_3 = split(fillet2_piece_3, bisect_by=Plane(origin=(-20.940546386, 2.4, 2.229867585), z_dir=(0, 1, 0)), keep=Keep.TOP, mode=Mode.PRIVATE)
    add(fillet2_piece_3, mode=Mode.SUBTRACT)
    with BuildSketch(Plane(origin=(-13.561324088, 7.37902639, -3.952729582), x_dir=(0.11068304606838107, -0.9461886483394651, -0.3040991697893313), z_dir=(-0.32361557711818506, -0.323615577118185, 0.8891264907159881))) as fillet2_piece_4_section:
        with BuildLine():
            CenterArc((FILLET2_R * 0.889126490716, -FILLET2_R), FILLET2_R, 90, 83.282286536)
            Line((-FILLET2_R * 0.104008041637, -FILLET2_R * 0.883022221559), (0, 0))
            Line((0, 0), (FILLET2_R * 0.889126490716, 0))
        make_face()
    fillet2_piece_4 = extrude(amount=15.6394611, mode=Mode.PRIVATE)
    fillet2_piece_4 = split(fillet2_piece_4, bisect_by=Plane(origin=(-16.253660478, 2.4, 2.229867585), z_dir=(0, 1, 0)), keep=Keep.TOP, mode=Mode.PRIVATE)
    add(fillet2_piece_4, mode=Mode.SUBTRACT)

    # Chamfer2
    chamfer2_edges = [part_2.edges().sort_by_distance(p)[0] for p in [
        (30, 2.4, 8),
        (-30, 2.4, 8),
    ]]
    chamfer(chamfer2_edges, length=CHAMFER2_SIZE)

    # Sketch39 → Cut-Extrude20 (cut, through all)
    with BuildSketch(Plane(origin=(0, 0, 10), x_dir=(-1, 0, 0), z_dir=(0, 0, -1)).offset(CUT_EXTRUDE20_START)):
        with Locations((50.736194558, -0.327009614)):
            Rectangle(SKETCH39_W, SKETCH39_H)
    extrude(amount=-CUT_EXTRUDE20_DEPTH, mode=Mode.SUBTRACT)

    # Sketch40 → Cut-Extrude21 (cut, two sides: drawn at the far end of the back side and taken through both)
    with BuildSketch(Plane(origin=(0, 2.4, 0), x_dir=(1, 0, 0), z_dir=(0, 1, 0)).offset(-CUT_EXTRUDE21_DEPTH_BACK)):
        Polygon((-33.879361629, -20), (95.398235412, -76.00132788), (-43.756067754, -79.660476008), align=None)
    extrude(amount=CUT_EXTRUDE21_DEPTH + CUT_EXTRUDE21_DEPTH_BACK, mode=Mode.SUBTRACT)

    # Chamfer3
    chamfer3_edges = [part_2.edges().sort_by_distance(p)[0] for p in [
        (-40.5, 0, 20),
        (0, -6.25, 34.676086827),
        (40.5, 0, 0),
        (40.5, 0, 50),
        (-40.5, 0, 0),
    ]]
    chamfer(chamfer3_edges, length=CHAMFER3_SIZE)

    # Fillet3
    fillet3_edges = [part_2.edges().sort_by_distance(p)[0] for p in [
        (-33.879361629, -1.5, 20),
        (35.374851763, -1.42007625, 50),
        (-37.627045624, -5.4, 10),
        (37.627045624, -5.4, 25),
    ]]
    fillet(fillet3_edges, radius=FILLET3_R)


solid = part_2.part
